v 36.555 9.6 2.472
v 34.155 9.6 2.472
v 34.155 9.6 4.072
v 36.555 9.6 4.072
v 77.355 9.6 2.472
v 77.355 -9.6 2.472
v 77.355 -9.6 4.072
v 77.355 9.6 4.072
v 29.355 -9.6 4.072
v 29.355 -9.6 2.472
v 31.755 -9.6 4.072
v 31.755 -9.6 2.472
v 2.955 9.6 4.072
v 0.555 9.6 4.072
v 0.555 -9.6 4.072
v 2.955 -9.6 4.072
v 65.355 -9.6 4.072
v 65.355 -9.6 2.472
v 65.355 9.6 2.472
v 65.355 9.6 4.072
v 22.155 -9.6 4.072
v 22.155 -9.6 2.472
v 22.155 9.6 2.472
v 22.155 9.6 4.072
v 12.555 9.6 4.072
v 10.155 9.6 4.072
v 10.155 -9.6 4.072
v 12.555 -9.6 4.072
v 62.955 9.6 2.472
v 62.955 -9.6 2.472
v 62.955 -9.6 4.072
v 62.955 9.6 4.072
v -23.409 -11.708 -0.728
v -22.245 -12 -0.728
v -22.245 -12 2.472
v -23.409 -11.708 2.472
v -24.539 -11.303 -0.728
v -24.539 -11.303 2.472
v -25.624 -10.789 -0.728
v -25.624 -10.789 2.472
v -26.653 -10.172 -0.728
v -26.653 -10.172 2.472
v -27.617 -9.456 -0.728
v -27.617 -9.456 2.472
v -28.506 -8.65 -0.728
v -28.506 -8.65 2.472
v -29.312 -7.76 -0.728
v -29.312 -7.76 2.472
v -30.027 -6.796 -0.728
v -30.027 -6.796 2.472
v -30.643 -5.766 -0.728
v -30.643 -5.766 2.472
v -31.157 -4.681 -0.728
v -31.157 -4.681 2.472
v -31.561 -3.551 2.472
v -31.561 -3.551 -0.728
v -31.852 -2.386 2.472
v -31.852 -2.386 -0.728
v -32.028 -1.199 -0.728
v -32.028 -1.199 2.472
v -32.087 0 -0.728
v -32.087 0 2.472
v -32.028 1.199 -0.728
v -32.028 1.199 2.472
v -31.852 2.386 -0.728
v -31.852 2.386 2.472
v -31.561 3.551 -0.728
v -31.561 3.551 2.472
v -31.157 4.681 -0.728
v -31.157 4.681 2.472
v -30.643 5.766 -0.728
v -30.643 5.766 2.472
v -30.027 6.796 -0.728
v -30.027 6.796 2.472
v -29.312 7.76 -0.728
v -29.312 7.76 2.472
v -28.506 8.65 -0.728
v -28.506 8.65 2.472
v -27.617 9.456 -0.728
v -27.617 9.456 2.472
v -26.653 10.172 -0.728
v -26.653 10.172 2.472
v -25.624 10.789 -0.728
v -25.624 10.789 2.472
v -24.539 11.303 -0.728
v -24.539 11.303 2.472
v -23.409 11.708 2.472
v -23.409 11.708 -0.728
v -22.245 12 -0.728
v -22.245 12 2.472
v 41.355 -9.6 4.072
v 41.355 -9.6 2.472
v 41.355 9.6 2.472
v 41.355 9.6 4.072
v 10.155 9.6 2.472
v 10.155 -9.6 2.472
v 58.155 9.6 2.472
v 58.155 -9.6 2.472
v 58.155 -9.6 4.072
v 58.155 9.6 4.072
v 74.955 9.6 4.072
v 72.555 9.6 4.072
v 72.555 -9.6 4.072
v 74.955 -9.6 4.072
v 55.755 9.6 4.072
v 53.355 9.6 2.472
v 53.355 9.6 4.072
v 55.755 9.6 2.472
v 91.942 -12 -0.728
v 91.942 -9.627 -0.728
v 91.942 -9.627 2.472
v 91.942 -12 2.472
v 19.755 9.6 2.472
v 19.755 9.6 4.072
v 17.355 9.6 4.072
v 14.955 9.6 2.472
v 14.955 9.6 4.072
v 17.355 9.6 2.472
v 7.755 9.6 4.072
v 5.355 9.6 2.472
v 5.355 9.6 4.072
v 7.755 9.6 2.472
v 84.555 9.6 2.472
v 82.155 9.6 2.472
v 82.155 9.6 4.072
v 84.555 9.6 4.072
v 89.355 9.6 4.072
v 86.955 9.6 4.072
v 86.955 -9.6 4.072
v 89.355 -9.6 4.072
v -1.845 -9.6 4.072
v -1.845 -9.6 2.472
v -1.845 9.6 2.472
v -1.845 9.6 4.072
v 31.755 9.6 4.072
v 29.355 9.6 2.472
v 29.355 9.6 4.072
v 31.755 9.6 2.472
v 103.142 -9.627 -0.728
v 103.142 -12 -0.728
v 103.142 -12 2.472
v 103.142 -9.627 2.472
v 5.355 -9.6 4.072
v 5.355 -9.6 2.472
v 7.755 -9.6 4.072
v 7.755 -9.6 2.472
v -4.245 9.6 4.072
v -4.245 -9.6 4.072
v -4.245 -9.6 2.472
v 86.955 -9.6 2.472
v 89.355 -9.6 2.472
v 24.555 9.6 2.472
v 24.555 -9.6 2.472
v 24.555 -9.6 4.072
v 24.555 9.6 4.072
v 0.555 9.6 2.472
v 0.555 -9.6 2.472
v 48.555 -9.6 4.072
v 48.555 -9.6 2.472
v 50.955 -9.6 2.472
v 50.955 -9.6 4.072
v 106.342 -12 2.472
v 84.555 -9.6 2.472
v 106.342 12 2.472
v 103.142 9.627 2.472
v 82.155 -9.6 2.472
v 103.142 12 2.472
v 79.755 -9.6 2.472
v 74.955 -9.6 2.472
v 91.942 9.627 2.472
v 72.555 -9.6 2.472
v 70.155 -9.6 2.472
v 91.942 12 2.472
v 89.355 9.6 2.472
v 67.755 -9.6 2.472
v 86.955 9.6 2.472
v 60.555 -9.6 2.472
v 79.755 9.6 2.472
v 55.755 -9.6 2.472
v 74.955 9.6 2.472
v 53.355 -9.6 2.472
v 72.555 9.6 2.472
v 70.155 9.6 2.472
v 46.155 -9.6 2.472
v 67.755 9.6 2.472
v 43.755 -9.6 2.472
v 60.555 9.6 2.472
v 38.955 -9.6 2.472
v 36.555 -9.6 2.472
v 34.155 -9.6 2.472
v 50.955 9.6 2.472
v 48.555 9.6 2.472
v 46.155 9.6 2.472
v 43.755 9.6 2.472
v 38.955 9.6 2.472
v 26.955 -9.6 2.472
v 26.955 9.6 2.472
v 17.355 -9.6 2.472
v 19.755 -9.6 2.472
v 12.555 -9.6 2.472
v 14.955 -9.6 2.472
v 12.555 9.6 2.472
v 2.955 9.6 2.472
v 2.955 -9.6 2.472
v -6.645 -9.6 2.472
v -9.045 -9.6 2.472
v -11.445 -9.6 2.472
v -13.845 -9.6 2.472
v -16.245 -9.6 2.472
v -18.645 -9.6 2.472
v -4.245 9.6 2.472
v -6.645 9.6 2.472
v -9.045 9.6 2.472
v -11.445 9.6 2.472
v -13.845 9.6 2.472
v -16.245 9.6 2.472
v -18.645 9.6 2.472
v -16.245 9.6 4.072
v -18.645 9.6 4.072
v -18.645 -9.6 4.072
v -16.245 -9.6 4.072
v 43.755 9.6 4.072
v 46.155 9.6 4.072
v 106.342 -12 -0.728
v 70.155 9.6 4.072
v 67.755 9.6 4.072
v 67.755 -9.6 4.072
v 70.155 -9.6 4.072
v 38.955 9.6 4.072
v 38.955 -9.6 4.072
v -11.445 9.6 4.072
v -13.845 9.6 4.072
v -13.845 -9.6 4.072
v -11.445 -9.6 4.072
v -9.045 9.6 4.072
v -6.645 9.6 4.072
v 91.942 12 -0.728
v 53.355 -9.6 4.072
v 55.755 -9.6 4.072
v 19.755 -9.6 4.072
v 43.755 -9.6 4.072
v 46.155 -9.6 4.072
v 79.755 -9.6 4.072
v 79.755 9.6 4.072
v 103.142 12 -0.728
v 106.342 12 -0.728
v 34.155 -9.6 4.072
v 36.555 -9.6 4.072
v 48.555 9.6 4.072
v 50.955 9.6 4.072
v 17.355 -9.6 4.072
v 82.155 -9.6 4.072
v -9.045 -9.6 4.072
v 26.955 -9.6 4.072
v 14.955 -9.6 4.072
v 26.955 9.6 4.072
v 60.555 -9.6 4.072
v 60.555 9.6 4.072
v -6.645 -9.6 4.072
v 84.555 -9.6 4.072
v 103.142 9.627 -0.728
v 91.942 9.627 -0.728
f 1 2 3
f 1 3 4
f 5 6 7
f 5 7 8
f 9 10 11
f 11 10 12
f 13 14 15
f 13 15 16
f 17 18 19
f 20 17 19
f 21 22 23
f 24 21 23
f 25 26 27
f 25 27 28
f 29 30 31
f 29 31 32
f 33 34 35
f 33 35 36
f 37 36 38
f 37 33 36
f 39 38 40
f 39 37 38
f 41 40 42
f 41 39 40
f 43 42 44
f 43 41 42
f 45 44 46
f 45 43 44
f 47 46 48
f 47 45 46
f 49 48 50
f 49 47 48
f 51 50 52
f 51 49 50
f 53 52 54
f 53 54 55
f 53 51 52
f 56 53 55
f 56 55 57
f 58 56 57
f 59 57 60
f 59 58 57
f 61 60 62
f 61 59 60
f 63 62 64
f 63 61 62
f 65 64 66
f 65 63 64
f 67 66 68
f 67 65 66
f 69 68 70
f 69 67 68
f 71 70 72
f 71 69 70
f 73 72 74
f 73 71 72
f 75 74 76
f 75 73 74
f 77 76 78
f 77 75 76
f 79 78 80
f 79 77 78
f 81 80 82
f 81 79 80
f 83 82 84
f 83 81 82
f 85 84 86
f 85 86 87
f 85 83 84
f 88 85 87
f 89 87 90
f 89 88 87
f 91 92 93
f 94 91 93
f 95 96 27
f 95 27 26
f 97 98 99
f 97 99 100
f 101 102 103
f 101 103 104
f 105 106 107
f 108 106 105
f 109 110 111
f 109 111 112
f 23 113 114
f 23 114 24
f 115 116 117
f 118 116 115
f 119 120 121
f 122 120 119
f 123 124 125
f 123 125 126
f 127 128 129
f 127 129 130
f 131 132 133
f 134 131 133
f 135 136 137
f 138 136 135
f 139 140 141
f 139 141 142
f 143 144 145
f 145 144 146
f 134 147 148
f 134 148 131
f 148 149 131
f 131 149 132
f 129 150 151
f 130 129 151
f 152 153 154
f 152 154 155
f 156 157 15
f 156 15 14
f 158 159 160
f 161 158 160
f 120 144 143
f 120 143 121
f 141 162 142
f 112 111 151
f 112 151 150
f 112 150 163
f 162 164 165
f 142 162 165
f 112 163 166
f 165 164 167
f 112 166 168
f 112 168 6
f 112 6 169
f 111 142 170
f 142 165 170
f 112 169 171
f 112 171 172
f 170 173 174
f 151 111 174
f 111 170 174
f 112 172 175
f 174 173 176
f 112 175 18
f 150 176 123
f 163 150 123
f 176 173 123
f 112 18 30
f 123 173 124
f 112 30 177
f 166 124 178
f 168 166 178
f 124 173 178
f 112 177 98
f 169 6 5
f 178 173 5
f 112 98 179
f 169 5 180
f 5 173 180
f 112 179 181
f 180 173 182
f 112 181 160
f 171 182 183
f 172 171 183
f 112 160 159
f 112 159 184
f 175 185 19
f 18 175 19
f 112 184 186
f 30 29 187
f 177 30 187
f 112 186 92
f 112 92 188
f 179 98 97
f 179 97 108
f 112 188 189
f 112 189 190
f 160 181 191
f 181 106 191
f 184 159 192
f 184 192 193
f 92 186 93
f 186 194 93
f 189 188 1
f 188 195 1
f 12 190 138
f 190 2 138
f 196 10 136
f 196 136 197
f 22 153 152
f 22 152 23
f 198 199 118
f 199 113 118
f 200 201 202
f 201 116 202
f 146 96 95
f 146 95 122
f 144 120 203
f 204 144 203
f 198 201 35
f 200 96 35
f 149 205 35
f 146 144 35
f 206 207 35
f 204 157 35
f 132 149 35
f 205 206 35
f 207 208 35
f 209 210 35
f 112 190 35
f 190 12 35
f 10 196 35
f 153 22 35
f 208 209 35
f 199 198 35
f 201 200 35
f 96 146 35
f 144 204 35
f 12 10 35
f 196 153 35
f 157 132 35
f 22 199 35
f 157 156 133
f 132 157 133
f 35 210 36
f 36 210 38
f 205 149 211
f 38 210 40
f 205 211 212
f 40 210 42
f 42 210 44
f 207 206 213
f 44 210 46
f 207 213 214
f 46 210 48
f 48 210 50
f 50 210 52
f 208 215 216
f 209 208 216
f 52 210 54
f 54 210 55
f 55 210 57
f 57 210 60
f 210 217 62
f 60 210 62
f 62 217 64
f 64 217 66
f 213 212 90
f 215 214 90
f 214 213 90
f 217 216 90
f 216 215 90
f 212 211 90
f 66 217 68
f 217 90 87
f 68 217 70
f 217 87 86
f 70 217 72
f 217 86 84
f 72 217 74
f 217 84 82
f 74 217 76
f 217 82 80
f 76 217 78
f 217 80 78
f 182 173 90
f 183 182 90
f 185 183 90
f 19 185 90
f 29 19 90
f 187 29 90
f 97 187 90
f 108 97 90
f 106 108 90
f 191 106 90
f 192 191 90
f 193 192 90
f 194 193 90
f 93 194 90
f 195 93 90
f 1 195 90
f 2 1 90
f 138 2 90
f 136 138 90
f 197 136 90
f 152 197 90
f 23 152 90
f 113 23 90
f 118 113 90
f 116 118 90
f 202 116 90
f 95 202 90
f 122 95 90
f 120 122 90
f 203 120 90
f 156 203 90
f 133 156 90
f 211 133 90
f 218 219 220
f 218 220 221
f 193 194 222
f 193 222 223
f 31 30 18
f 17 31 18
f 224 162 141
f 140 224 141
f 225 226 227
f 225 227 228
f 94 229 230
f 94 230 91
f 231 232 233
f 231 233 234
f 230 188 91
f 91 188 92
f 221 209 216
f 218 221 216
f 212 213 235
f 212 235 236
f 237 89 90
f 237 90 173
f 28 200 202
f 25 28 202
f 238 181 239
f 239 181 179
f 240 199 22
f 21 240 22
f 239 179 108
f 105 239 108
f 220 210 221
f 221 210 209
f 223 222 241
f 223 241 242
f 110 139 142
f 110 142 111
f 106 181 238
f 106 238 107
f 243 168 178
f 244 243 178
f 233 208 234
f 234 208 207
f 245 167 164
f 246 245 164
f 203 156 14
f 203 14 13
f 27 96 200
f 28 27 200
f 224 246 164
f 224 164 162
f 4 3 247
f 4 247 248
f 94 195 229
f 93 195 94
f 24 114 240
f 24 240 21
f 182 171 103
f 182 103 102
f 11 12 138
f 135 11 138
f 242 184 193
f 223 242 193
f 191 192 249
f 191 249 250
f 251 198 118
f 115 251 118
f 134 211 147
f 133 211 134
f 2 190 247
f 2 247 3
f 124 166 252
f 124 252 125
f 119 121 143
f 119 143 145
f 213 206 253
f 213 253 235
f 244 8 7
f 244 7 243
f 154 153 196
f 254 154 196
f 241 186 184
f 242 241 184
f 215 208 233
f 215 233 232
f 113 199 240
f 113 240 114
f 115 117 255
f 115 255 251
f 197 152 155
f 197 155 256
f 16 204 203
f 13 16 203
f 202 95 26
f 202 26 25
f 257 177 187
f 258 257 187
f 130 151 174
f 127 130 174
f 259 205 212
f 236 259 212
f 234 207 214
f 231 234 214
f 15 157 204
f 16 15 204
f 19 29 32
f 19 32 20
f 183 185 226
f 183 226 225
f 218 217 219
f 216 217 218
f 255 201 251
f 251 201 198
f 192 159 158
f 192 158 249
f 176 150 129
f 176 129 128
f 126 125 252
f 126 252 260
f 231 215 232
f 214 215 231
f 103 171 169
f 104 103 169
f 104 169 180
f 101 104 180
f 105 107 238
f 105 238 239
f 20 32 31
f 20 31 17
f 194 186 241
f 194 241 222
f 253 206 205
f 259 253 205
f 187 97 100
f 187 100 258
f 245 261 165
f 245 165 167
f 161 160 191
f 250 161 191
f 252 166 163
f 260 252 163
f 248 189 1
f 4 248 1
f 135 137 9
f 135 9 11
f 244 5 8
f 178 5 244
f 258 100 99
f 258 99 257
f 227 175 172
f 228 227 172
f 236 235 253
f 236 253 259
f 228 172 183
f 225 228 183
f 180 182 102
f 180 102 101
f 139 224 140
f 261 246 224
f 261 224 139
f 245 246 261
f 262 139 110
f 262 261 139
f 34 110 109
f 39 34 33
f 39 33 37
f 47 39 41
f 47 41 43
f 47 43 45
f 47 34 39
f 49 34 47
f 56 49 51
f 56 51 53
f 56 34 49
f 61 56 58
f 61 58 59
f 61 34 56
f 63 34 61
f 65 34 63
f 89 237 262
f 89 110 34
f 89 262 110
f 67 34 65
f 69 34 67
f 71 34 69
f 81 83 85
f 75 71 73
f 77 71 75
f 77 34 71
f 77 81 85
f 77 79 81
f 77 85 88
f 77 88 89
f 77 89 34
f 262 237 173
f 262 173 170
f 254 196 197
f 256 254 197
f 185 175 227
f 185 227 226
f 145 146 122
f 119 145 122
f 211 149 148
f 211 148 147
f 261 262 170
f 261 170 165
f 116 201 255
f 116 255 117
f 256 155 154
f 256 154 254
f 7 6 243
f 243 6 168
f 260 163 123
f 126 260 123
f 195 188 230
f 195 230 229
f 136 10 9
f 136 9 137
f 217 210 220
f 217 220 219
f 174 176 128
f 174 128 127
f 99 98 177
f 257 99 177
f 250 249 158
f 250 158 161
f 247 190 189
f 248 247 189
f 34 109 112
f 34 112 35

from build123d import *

# Parameters (mm, degrees)
EXTRUDE_1_DEPTH = 2
SKETCH_2_W      = 1.5
SKETCH_2_H      = 12
EXTRUDE_2_DEPTH = 1
SCALE_1_SCALE   = 1.6


with BuildPart() as part:
    # 草图1 → 凸台-拉伸1 (new body)
    with BuildSketch(Plane.XY):
        with BuildLine():
            Line((0, 7.5), (71.36690944, 7.5))
            Line((71.36690944, 7.5), (71.36690944, 6.01680195))
            Line((71.36690944, 6.01680195), (78.36690944, 6.01680195))
            Line((78.36690944, 6.01680195), (78.36690944, 7.5))
            Line((78.36690944, 7.5), (80.36690944, 7.5))
            Line((80.36690944, 7.5), (80.36690944, -7.5))
            Line((80.36690944, -7.5), (78.36690944, -7.5))
            Line((78.36690944, -7.5), (78.36690944, -6.01680195))
            Line((78.36690944, -6.01680195), (71.36690944, -6.01680195))
            Line((71.36690944, -6.01680195), (71.36690944, -7.5))
            Line((71.36690944, -7.5), (0, -7.5))
            ThreePointArc((0, -7.5), (-6.151670717, 0), (0, 7.5))
        make_face()
    extrude(amount=EXTRUDE_1_DEPTH)

    # 草图2 → 凸台-拉伸2 (add)
    with BuildSketch(Plane.XY.offset(2)):
        with Locations((3, 0)):
            Rectangle(SKETCH_2_W, SKETCH_2_H)
        with Locations((6, 0)):
            Rectangle(SKETCH_2_W, SKETCH_2_H)
        with Locations((9, 0)):
            Rectangle(SKETCH_2_W, SKETCH_2_H)
        with Locations((12, 0)):
            Rectangle(SKETCH_2_W, SKETCH_2_H)
        with Locations((15, 0)):
            Rectangle(SKETCH_2_W, SKETCH_2_H)
        with Locations((18, 0)):
            Rectangle(SKETCH_2_W, SKETCH_2_H)
        with Locations((21, 0)):
            Rectangle(SKETCH_2_W, SKETCH_2_H)
        with Locations((24, 0)):
            Rectangle(SKETCH_2_W, SKETCH_2_H)
        with Locations((27, 0)):
            Rectangle(SKETCH_2_W, SKETCH_2_H)
        with Locations((30, 0)):
            Rectangle(SKETCH_2_W, SKETCH_2_H)
        with Locations((33, 0)):
            Rectangle(SKETCH_2_W, SKETCH_2_H)
        with Locations((36, 0)):
            Rectangle(SKETCH_2_W, SKETCH_2_H)
        with Locations((39, 0)):
            Rectangle(SKETCH_2_W, SKETCH_2_H)
        with Locations((42, 0)):
            Rectangle(SKETCH_2_W, SKETCH_2_H)
        with Locations((45, 0)):
            Rectangle(SKETCH_2_W, SKETCH_2_H)
        with Locations((48, 0)):
            Rectangle(SKETCH_2_W, SKETCH_2_H)
        with Locations((51, 0)):
            Rectangle(SKETCH_2_W, SKETCH_2_H)
        with Locations((54, 0)):
            Rectangle(SKETCH_2_W, SKETCH_2_H)
        with Locations((57, 0)):
            Rectangle(SKETCH_2_W, SKETCH_2_H)
        with Locations((60, 0)):
            Rectangle(SKETCH_2_W, SKETCH_2_H)
        with Locations((63, 0)):
            Rectangle(SKETCH_2_W, SKETCH_2_H)
        with Locations((66, 0)):
            Rectangle(SKETCH_2_W, SKETCH_2_H)
        with Locations((69, 0)):
            Rectangle(SKETCH_2_W, SKETCH_2_H)
    extrude(amount=EXTRUDE_2_DEPTH)


with BuildPart() as part_1:
    # 缩放比例1: scaled about (37.07427317, 0, 1.212543803)
    add(part.part.scale(SCALE_1_SCALE).moved(Location((-22.244563902, 0, -0.727526282))))


solid = part_1.part
